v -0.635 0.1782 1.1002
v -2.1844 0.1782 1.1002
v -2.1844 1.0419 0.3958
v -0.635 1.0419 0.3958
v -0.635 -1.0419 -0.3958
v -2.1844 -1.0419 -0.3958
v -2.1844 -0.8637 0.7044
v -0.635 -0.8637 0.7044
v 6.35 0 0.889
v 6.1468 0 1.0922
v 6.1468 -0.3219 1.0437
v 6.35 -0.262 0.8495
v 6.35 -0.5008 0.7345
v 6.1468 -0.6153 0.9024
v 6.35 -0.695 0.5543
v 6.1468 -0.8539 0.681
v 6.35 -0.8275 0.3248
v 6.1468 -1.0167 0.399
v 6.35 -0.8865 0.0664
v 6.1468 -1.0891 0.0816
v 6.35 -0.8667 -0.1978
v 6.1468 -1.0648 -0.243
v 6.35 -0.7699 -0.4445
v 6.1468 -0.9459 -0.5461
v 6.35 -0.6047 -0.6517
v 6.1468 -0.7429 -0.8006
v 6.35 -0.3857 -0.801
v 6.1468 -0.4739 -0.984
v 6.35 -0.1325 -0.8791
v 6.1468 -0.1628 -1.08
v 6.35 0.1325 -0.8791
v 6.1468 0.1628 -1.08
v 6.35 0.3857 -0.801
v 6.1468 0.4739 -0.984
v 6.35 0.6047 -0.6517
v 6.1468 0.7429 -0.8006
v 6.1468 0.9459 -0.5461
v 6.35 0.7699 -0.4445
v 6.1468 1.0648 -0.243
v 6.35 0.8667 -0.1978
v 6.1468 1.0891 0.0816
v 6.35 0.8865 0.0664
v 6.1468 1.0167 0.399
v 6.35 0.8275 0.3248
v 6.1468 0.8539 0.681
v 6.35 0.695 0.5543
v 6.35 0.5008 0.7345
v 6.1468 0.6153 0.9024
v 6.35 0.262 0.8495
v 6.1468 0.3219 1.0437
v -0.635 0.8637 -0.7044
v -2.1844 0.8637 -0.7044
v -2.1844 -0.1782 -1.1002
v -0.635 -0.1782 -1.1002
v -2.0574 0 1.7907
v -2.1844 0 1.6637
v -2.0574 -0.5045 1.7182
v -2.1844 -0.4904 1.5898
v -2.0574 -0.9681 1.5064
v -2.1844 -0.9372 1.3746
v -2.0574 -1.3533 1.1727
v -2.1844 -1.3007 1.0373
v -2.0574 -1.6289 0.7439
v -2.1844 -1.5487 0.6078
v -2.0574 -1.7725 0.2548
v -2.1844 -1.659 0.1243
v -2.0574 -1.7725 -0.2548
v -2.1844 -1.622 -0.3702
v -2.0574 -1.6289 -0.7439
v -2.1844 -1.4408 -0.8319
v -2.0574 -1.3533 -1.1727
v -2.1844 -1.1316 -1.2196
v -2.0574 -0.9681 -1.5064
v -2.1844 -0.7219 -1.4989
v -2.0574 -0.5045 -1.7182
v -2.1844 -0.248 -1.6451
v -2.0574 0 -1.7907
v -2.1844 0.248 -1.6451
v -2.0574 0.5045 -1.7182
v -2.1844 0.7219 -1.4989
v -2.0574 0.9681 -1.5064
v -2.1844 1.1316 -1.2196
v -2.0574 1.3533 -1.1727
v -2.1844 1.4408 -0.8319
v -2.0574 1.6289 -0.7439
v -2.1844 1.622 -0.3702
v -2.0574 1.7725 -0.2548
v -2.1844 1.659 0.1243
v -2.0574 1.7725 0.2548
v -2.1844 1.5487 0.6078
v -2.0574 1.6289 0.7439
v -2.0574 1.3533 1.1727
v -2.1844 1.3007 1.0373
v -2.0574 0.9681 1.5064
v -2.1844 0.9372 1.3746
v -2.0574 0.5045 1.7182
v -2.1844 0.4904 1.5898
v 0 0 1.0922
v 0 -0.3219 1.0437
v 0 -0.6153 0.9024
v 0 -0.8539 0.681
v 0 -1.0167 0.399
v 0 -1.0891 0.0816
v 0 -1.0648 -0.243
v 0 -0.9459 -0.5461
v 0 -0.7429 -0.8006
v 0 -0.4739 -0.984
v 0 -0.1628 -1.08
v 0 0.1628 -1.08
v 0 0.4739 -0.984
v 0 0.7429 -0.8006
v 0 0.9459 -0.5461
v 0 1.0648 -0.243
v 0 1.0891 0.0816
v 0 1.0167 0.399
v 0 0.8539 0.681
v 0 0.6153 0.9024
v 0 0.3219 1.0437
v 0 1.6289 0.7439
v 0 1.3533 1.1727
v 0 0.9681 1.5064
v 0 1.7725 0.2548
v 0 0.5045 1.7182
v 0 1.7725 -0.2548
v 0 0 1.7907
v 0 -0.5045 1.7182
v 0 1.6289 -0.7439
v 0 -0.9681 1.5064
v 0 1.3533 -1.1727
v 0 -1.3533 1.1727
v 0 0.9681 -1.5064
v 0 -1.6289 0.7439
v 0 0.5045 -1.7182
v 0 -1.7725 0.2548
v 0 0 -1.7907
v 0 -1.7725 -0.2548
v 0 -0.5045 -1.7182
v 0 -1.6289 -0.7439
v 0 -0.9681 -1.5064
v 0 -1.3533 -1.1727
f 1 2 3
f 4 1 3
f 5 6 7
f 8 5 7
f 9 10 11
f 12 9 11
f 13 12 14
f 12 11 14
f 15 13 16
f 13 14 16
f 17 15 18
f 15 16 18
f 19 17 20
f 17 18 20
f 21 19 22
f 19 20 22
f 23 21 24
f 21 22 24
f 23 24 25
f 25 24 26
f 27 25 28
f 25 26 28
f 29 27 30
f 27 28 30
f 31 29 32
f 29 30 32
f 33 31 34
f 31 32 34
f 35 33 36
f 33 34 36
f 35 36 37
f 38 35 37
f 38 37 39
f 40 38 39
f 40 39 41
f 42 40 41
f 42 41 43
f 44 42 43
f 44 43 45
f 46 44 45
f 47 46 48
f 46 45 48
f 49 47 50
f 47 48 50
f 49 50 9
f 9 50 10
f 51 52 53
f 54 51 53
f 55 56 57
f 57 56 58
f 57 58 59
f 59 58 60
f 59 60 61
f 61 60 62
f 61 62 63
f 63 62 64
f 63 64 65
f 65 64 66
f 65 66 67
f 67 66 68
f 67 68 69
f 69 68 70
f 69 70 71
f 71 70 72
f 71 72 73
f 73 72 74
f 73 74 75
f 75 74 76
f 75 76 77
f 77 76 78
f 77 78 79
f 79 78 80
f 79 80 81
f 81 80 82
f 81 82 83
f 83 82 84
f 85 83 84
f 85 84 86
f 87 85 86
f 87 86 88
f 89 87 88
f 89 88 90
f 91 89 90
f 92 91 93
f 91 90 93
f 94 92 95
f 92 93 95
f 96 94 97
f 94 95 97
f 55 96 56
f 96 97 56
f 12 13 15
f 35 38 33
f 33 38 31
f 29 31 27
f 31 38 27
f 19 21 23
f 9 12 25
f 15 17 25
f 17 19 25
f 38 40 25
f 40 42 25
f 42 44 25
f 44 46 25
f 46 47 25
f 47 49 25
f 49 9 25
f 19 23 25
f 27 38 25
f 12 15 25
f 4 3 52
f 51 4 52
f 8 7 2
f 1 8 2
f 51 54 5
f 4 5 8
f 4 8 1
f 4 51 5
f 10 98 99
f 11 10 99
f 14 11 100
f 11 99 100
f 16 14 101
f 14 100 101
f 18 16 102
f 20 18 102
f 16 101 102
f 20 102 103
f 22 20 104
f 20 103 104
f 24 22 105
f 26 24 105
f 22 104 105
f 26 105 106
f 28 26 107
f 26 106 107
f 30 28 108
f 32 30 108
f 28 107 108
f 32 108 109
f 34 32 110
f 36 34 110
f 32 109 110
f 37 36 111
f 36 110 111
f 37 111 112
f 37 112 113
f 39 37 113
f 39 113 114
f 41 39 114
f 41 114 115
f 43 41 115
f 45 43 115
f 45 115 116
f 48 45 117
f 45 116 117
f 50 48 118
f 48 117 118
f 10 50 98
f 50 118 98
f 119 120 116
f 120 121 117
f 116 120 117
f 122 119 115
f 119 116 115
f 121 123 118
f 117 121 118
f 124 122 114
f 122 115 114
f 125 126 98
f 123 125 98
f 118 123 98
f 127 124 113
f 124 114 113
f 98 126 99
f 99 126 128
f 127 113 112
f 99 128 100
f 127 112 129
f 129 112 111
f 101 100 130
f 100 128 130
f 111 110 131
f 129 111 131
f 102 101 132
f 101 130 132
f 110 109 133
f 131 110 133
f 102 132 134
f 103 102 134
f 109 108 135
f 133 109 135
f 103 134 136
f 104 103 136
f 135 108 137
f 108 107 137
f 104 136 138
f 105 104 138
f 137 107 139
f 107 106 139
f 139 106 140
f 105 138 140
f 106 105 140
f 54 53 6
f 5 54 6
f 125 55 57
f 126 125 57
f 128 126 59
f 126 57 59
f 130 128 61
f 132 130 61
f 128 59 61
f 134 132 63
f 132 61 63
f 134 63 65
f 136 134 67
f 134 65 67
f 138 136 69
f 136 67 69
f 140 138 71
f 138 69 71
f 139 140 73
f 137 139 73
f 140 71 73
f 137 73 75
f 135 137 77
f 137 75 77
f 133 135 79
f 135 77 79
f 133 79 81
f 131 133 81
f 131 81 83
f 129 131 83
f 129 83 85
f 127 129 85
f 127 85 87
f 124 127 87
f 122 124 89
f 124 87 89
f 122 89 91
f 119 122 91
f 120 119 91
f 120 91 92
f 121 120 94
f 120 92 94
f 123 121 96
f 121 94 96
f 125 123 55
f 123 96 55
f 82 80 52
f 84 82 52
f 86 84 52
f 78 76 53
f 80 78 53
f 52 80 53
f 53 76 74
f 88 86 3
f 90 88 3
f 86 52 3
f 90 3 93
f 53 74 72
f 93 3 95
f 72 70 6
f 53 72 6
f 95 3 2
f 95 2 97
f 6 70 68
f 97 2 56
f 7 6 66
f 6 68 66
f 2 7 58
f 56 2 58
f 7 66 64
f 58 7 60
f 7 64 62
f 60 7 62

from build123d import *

# Parameters (mm, degrees)
CHAMFER1_SIZE      = 0.2032
CHAMFER2_SIZE      = 0.127
CUT_EXTRUDE1_DEPTH = 1.5494


with BuildPart() as part:
    # Sketch1 → Revolve1 (revolve)
    with BuildSketch(Plane.XY, mode=Mode.PRIVATE) as revolve1_sk:
        Polygon((-2.1844, 0), (6.35, 0), (6.35, 1.0922), (0, 1.0922), (0, 1.7907), (-2.1844, 1.7907), align=None)
    revolve(revolve1_sk.sketch.rotate(Axis((-2.1844, 0, 0), (1, 0, 0)), 90), axis=Axis((-2.1844, 0, 0), (1, 0, 0)))

    # Chamfer1
    chamfer1_edges = [part.edges().sort_by_distance(p)[0] for p in [
        (6.35, 0, -1.0922),
    ]]
    chamfer(chamfer1_edges, length=CHAMFER1_SIZE)

    # Chamfer2
    chamfer2_edges = [part.edges().sort_by_distance(p)[0] for p in [
        (-2.1844, 0, -1.7907),
    ]]
    chamfer(chamfer2_edges, length=CHAMFER2_SIZE)

    # Sketch2 → Cut-Extrude1 (cut)
    with BuildSketch(Plane.ZY.offset(2.1844)):
        Polygon((1.100183814, 0.178167419), (0.395794396, 1.041870841), (-0.704389418, 0.863703422), (-1.100183814, -0.178167419), (-0.395794396, -1.041870841), (0.704389418, -0.863703422), align=None)
    extrude(amount=-CUT_EXTRUDE1_DEPTH, mode=Mode.SUBTRACT)


solid = part.part
